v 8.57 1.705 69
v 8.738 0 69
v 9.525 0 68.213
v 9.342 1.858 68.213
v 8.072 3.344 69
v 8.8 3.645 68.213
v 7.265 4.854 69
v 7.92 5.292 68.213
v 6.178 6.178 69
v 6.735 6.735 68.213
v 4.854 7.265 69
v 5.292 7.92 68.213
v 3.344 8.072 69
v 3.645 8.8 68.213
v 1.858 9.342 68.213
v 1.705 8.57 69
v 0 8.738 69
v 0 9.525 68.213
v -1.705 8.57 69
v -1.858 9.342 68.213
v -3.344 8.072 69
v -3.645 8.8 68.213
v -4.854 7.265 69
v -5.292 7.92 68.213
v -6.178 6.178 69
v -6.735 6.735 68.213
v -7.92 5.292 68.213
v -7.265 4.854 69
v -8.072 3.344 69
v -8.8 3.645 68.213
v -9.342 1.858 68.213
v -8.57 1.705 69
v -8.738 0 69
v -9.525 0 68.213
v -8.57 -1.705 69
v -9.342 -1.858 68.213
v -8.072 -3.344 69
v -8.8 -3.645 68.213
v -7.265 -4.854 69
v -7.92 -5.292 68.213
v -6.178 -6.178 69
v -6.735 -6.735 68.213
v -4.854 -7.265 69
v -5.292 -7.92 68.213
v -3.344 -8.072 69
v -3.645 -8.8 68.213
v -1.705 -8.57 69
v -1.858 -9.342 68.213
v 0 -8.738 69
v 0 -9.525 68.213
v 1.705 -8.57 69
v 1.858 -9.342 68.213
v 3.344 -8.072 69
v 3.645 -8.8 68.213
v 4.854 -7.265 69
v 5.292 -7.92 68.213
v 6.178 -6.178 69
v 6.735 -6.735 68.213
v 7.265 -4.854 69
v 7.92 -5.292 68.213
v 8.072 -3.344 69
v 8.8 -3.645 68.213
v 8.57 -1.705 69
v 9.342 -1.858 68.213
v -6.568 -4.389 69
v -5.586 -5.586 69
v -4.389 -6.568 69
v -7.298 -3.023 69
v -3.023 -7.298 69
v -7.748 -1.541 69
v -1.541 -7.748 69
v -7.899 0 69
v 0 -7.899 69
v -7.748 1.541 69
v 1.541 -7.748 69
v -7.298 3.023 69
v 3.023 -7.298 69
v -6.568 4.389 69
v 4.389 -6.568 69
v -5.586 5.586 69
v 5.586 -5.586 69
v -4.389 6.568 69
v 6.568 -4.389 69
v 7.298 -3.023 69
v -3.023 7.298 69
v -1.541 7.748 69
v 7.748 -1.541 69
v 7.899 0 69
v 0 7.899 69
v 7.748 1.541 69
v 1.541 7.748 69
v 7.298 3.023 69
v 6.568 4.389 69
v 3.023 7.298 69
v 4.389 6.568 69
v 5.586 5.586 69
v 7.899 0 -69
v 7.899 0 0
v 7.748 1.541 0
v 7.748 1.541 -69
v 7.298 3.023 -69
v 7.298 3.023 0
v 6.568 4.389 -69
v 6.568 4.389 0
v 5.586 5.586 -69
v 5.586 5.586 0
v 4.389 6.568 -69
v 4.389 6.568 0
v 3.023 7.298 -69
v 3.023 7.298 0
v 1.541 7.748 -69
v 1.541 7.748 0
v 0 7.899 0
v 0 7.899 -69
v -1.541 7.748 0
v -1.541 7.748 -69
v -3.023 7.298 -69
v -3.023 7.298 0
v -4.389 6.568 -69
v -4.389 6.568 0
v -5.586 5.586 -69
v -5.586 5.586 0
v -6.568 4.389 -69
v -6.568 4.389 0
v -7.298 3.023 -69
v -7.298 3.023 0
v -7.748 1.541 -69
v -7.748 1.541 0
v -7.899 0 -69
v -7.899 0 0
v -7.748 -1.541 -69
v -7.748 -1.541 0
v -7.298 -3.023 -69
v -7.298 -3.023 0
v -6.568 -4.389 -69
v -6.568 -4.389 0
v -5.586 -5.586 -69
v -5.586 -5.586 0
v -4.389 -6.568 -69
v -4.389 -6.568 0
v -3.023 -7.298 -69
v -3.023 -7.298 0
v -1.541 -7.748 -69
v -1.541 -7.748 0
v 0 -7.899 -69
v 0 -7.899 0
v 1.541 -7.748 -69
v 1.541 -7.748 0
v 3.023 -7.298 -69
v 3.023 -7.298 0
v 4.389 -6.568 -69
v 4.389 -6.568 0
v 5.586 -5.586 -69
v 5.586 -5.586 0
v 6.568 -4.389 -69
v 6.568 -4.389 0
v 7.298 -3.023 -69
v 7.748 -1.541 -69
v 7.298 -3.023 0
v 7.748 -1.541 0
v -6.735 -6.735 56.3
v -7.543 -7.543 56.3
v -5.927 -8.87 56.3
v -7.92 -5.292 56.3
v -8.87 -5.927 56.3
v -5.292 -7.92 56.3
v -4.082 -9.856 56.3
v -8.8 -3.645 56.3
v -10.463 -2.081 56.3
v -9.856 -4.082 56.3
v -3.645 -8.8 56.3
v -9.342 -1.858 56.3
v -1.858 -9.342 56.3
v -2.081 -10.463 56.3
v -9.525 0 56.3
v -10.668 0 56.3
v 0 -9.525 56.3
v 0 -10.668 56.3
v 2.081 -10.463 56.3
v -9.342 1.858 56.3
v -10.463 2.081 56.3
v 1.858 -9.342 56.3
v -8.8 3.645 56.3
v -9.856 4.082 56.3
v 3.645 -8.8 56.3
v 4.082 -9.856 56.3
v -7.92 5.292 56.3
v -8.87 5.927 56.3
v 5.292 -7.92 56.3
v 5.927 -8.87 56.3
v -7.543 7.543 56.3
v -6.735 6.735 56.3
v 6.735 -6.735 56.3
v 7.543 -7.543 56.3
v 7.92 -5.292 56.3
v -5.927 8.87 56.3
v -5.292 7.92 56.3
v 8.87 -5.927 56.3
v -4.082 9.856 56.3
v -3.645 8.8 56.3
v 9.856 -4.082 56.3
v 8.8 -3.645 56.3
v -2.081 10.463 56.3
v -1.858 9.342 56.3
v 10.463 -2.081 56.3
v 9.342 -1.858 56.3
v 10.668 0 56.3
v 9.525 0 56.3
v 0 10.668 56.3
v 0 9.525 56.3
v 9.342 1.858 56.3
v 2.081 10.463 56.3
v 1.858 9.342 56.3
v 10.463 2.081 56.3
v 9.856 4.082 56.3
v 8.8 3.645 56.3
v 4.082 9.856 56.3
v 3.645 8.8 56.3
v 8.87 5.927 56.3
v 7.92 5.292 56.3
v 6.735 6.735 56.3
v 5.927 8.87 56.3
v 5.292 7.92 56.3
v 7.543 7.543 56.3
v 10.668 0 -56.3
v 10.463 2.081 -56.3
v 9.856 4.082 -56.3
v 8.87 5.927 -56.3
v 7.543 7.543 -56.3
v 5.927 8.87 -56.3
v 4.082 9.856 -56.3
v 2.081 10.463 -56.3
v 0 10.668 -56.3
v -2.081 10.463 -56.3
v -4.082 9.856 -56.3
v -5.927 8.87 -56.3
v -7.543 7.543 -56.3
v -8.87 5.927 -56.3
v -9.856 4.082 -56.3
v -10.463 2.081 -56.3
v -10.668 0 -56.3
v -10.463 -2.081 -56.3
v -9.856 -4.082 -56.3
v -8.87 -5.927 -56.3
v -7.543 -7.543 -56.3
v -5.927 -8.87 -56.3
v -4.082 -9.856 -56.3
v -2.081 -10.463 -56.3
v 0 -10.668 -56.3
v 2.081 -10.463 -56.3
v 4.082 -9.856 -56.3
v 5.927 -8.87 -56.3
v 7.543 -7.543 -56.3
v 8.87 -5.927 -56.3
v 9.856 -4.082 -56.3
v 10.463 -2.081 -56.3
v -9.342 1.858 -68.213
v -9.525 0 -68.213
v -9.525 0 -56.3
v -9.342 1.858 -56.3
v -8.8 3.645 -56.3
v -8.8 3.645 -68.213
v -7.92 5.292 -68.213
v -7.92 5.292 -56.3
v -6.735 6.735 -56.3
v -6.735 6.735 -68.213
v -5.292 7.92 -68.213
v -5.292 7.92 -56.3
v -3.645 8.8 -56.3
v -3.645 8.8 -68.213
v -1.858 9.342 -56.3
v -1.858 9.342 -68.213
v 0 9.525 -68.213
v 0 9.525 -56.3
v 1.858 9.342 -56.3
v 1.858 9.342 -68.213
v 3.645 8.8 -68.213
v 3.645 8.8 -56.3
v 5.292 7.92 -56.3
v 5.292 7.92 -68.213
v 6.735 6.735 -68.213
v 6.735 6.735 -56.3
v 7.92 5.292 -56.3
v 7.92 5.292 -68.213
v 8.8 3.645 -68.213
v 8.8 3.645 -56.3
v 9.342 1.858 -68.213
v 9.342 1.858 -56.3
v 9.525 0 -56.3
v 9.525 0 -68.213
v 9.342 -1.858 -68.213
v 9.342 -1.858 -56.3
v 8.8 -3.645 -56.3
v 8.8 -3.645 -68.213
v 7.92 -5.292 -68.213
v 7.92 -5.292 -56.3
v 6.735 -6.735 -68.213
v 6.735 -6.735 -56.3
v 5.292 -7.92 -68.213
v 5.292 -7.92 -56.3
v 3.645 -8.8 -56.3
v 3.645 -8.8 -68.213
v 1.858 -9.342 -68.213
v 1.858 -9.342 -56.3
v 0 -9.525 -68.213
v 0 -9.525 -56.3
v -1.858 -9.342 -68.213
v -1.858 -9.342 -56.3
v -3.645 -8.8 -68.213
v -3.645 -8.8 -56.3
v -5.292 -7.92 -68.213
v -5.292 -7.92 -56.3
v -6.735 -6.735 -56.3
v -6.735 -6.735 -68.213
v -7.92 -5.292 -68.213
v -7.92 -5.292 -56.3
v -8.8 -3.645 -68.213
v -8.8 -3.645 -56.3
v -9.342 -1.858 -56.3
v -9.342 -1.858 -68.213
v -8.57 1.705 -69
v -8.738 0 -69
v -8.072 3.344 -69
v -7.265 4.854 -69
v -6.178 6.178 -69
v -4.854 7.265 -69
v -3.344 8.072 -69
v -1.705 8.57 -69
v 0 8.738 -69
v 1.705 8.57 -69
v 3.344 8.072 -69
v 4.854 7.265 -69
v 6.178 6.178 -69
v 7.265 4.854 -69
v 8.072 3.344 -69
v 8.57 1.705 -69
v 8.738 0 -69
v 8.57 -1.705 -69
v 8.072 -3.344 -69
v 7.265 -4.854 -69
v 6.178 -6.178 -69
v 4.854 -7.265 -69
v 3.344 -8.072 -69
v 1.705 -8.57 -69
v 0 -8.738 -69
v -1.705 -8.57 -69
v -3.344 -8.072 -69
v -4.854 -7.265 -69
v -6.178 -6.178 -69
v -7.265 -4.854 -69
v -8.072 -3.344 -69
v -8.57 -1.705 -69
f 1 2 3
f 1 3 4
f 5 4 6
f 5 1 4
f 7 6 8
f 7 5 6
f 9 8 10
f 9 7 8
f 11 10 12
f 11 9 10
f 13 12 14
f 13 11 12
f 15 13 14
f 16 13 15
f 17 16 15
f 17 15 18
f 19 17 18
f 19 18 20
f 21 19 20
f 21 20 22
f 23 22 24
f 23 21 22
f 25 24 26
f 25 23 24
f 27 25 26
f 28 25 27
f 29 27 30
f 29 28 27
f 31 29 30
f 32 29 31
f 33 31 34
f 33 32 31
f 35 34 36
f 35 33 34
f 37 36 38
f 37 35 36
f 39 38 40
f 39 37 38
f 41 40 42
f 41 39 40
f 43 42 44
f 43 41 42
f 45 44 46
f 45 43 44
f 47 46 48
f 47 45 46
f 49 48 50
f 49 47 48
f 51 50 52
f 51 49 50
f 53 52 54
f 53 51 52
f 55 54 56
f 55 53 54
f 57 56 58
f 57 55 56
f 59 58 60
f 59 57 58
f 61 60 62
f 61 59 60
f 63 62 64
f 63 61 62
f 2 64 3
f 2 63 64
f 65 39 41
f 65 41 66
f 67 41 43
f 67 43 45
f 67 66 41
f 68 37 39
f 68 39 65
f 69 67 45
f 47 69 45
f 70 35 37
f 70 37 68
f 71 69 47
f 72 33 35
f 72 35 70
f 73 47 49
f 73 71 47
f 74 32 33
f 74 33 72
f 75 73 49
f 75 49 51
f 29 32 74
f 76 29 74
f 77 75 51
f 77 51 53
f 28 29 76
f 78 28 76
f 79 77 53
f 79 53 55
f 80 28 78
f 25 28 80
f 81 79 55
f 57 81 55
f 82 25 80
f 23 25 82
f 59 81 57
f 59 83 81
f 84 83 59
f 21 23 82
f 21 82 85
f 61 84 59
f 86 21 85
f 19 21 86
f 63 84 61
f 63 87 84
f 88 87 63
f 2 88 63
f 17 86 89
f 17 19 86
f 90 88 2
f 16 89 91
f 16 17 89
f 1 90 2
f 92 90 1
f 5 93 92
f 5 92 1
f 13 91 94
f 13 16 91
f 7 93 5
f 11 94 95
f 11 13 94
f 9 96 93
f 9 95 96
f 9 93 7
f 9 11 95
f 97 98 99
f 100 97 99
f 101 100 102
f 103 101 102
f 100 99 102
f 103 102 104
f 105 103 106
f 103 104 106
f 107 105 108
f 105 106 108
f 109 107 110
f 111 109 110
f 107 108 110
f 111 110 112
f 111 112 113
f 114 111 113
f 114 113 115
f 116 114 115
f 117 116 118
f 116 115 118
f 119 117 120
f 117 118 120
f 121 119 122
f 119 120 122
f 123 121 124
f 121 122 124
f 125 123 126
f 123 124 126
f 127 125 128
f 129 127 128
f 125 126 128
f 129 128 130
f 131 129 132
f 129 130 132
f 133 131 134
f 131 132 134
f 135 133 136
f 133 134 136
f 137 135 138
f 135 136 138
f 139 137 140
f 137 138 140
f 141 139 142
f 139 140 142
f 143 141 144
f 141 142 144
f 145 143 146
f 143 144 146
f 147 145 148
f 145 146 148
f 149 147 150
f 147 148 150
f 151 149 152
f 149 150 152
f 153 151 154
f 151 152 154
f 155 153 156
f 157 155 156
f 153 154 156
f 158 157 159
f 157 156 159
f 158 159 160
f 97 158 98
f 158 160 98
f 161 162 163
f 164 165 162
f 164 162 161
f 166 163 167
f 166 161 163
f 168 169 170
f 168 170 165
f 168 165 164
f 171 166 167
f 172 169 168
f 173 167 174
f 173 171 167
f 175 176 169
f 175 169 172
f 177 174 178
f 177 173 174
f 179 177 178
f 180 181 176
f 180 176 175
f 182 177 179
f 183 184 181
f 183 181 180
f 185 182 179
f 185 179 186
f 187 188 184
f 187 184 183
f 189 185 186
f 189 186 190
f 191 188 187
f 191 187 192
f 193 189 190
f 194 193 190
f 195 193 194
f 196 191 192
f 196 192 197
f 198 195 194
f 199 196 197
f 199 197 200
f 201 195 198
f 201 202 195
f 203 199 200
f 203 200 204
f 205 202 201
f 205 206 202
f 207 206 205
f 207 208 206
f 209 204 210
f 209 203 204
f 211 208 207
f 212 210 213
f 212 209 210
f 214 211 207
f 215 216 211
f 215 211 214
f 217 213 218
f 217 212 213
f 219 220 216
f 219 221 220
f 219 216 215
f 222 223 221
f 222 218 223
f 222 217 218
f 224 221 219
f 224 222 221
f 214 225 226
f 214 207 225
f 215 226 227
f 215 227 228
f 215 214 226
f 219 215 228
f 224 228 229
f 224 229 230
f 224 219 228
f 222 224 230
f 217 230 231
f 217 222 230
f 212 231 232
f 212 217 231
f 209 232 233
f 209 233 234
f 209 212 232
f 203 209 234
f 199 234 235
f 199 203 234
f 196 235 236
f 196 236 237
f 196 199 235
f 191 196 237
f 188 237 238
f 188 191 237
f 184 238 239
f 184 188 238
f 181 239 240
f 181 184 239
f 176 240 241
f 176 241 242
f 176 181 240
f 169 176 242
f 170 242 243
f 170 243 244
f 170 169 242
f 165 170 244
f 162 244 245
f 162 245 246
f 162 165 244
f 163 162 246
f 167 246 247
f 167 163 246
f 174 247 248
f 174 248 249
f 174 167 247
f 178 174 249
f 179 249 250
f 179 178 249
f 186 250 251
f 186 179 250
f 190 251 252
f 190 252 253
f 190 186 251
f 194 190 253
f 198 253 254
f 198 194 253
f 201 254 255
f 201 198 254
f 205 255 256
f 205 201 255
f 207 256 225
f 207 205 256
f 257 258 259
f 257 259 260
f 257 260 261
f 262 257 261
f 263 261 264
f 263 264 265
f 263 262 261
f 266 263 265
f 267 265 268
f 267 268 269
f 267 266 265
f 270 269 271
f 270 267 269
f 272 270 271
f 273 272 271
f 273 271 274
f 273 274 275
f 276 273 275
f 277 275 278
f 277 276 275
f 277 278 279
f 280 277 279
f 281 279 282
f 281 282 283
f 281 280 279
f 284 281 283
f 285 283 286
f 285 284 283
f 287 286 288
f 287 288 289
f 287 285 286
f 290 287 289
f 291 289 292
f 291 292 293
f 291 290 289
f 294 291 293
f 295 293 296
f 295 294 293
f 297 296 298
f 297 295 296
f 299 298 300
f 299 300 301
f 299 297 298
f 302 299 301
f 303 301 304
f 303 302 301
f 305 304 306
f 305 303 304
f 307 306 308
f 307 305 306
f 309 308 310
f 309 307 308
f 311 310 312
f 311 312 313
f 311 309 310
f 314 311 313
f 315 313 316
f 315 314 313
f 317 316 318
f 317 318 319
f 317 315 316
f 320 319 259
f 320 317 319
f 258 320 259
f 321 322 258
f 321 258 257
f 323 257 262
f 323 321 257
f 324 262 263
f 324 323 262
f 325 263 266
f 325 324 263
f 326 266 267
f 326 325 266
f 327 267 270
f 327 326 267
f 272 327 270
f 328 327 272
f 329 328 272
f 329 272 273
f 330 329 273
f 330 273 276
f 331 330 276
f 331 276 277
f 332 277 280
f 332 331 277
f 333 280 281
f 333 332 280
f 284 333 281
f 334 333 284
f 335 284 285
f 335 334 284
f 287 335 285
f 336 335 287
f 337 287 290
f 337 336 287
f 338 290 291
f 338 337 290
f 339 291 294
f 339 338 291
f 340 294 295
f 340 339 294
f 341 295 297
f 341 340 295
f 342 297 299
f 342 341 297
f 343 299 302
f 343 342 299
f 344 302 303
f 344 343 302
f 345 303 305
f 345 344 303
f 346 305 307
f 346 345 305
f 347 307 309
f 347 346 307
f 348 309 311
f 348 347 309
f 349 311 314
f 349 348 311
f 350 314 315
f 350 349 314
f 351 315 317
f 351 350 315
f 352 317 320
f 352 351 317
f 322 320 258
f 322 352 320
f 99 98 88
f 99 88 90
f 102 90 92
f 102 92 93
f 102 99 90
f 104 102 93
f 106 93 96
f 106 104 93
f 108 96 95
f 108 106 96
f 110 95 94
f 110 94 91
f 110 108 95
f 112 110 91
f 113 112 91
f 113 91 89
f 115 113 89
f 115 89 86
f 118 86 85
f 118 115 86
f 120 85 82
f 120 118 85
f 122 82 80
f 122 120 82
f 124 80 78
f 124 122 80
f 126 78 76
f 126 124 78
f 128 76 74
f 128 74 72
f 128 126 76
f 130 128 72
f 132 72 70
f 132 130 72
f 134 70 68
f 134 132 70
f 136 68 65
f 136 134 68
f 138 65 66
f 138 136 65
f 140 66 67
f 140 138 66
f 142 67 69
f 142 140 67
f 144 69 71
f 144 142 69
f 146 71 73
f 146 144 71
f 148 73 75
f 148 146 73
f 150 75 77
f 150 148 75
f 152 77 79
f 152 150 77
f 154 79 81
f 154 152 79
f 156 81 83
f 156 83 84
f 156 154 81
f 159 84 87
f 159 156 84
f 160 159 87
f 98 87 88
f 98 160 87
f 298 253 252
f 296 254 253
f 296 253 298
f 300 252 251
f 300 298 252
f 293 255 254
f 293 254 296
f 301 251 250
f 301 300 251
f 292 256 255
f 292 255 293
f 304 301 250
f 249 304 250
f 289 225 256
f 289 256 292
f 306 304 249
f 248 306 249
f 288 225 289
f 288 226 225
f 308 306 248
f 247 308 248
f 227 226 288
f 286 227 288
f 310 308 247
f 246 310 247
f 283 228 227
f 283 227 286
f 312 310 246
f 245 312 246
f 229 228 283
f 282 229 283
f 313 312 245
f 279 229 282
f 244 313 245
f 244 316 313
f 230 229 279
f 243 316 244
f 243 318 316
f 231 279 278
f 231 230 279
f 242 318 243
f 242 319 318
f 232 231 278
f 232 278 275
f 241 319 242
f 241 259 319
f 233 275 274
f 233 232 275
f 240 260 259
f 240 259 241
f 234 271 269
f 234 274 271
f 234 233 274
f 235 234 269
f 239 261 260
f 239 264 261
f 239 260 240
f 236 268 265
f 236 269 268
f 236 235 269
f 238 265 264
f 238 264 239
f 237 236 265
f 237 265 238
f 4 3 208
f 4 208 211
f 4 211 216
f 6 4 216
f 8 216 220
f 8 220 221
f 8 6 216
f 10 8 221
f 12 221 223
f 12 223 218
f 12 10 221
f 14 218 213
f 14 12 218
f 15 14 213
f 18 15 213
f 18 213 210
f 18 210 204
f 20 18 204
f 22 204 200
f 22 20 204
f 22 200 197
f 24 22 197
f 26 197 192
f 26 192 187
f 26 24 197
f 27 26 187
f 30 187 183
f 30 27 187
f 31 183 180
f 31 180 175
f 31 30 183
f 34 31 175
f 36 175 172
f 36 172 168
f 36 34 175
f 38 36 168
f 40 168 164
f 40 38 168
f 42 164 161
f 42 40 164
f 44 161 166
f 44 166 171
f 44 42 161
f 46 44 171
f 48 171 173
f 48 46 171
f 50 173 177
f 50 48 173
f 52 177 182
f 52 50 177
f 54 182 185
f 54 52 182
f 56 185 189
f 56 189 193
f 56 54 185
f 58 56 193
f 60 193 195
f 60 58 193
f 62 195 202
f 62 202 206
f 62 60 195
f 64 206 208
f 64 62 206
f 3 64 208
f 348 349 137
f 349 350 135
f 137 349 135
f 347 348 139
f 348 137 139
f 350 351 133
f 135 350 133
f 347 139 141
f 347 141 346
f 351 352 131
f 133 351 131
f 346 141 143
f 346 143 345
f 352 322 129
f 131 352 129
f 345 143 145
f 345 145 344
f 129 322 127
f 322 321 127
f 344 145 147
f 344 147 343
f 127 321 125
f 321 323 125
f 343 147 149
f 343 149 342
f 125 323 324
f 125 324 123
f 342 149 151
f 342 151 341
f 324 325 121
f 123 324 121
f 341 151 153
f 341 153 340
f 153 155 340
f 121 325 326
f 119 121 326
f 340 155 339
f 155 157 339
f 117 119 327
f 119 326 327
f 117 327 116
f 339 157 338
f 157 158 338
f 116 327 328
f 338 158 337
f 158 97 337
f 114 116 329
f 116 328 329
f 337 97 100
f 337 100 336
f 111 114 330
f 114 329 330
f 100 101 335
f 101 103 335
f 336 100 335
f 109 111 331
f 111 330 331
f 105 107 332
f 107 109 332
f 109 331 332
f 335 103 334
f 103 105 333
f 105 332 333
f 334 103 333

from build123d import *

# Parameters (mm, degrees)
BOSS_EXTRUDE1_DEPTH      = 69
BOSS_EXTRUDE1_DEPTH_BACK = 69
SKETCH1_R                = 10.668
SKETCH1_R_2              = 7.8994
SKETCH2_R                = 15.23227921
SKETCH2_R_2              = 9.525
CUT_EXTRUDE1_DEPTH       = 12.7
CUT_EXTRUDE2_START       = -12.7
SKETCH3_R                = 15.23227921
SKETCH3_R_2              = 9.525
CUT_EXTRUDE2_DEPTH       = 12.7
CHAMFER1_SIZE            = 0.7874


with BuildPart() as part:
    # Sketch1 → Boss-Extrude1 (new, two sides: drawn at the far end of the back side and taken through both)
    with BuildSketch(Plane.XY.offset(-BOSS_EXTRUDE1_DEPTH_BACK)):
        Circle(SKETCH1_R)
        Circle(SKETCH1_R_2, mode=Mode.SUBTRACT)
    extrude(amount=BOSS_EXTRUDE1_DEPTH + BOSS_EXTRUDE1_DEPTH_BACK)

    # Sketch2 → Cut-Extrude1 (cut)
    with BuildSketch(Plane.XY.offset(69)):
        Circle(SKETCH2_R)
        Circle(SKETCH2_R_2, mode=Mode.SUBTRACT)
    extrude(amount=-CUT_EXTRUDE1_DEPTH, mode=Mode.SUBTRACT)

    # Sketch3 → Cut-Extrude2 (cut)
    with BuildSketch(Plane(origin=(0, 0, -69), x_dir=(-1, 0, 0), z_dir=(0, 0, -1)).offset(CUT_EXTRUDE2_START)):
        Circle(SKETCH3_R)
        Circle(SKETCH3_R_2, mode=Mode.SUBTRACT)
    extrude(amount=CUT_EXTRUDE2_DEPTH, mode=Mode.SUBTRACT)

    # Chamfer1
    chamfer1_edges = [part.edges().sort_by_distance(p)[0] for p in [
        (-9.525, 0, 69),
        (9.525, 0, -69),
    ]]
    chamfer(chamfer1_edges, length=CHAMFER1_SIZE)


solid = part.part
